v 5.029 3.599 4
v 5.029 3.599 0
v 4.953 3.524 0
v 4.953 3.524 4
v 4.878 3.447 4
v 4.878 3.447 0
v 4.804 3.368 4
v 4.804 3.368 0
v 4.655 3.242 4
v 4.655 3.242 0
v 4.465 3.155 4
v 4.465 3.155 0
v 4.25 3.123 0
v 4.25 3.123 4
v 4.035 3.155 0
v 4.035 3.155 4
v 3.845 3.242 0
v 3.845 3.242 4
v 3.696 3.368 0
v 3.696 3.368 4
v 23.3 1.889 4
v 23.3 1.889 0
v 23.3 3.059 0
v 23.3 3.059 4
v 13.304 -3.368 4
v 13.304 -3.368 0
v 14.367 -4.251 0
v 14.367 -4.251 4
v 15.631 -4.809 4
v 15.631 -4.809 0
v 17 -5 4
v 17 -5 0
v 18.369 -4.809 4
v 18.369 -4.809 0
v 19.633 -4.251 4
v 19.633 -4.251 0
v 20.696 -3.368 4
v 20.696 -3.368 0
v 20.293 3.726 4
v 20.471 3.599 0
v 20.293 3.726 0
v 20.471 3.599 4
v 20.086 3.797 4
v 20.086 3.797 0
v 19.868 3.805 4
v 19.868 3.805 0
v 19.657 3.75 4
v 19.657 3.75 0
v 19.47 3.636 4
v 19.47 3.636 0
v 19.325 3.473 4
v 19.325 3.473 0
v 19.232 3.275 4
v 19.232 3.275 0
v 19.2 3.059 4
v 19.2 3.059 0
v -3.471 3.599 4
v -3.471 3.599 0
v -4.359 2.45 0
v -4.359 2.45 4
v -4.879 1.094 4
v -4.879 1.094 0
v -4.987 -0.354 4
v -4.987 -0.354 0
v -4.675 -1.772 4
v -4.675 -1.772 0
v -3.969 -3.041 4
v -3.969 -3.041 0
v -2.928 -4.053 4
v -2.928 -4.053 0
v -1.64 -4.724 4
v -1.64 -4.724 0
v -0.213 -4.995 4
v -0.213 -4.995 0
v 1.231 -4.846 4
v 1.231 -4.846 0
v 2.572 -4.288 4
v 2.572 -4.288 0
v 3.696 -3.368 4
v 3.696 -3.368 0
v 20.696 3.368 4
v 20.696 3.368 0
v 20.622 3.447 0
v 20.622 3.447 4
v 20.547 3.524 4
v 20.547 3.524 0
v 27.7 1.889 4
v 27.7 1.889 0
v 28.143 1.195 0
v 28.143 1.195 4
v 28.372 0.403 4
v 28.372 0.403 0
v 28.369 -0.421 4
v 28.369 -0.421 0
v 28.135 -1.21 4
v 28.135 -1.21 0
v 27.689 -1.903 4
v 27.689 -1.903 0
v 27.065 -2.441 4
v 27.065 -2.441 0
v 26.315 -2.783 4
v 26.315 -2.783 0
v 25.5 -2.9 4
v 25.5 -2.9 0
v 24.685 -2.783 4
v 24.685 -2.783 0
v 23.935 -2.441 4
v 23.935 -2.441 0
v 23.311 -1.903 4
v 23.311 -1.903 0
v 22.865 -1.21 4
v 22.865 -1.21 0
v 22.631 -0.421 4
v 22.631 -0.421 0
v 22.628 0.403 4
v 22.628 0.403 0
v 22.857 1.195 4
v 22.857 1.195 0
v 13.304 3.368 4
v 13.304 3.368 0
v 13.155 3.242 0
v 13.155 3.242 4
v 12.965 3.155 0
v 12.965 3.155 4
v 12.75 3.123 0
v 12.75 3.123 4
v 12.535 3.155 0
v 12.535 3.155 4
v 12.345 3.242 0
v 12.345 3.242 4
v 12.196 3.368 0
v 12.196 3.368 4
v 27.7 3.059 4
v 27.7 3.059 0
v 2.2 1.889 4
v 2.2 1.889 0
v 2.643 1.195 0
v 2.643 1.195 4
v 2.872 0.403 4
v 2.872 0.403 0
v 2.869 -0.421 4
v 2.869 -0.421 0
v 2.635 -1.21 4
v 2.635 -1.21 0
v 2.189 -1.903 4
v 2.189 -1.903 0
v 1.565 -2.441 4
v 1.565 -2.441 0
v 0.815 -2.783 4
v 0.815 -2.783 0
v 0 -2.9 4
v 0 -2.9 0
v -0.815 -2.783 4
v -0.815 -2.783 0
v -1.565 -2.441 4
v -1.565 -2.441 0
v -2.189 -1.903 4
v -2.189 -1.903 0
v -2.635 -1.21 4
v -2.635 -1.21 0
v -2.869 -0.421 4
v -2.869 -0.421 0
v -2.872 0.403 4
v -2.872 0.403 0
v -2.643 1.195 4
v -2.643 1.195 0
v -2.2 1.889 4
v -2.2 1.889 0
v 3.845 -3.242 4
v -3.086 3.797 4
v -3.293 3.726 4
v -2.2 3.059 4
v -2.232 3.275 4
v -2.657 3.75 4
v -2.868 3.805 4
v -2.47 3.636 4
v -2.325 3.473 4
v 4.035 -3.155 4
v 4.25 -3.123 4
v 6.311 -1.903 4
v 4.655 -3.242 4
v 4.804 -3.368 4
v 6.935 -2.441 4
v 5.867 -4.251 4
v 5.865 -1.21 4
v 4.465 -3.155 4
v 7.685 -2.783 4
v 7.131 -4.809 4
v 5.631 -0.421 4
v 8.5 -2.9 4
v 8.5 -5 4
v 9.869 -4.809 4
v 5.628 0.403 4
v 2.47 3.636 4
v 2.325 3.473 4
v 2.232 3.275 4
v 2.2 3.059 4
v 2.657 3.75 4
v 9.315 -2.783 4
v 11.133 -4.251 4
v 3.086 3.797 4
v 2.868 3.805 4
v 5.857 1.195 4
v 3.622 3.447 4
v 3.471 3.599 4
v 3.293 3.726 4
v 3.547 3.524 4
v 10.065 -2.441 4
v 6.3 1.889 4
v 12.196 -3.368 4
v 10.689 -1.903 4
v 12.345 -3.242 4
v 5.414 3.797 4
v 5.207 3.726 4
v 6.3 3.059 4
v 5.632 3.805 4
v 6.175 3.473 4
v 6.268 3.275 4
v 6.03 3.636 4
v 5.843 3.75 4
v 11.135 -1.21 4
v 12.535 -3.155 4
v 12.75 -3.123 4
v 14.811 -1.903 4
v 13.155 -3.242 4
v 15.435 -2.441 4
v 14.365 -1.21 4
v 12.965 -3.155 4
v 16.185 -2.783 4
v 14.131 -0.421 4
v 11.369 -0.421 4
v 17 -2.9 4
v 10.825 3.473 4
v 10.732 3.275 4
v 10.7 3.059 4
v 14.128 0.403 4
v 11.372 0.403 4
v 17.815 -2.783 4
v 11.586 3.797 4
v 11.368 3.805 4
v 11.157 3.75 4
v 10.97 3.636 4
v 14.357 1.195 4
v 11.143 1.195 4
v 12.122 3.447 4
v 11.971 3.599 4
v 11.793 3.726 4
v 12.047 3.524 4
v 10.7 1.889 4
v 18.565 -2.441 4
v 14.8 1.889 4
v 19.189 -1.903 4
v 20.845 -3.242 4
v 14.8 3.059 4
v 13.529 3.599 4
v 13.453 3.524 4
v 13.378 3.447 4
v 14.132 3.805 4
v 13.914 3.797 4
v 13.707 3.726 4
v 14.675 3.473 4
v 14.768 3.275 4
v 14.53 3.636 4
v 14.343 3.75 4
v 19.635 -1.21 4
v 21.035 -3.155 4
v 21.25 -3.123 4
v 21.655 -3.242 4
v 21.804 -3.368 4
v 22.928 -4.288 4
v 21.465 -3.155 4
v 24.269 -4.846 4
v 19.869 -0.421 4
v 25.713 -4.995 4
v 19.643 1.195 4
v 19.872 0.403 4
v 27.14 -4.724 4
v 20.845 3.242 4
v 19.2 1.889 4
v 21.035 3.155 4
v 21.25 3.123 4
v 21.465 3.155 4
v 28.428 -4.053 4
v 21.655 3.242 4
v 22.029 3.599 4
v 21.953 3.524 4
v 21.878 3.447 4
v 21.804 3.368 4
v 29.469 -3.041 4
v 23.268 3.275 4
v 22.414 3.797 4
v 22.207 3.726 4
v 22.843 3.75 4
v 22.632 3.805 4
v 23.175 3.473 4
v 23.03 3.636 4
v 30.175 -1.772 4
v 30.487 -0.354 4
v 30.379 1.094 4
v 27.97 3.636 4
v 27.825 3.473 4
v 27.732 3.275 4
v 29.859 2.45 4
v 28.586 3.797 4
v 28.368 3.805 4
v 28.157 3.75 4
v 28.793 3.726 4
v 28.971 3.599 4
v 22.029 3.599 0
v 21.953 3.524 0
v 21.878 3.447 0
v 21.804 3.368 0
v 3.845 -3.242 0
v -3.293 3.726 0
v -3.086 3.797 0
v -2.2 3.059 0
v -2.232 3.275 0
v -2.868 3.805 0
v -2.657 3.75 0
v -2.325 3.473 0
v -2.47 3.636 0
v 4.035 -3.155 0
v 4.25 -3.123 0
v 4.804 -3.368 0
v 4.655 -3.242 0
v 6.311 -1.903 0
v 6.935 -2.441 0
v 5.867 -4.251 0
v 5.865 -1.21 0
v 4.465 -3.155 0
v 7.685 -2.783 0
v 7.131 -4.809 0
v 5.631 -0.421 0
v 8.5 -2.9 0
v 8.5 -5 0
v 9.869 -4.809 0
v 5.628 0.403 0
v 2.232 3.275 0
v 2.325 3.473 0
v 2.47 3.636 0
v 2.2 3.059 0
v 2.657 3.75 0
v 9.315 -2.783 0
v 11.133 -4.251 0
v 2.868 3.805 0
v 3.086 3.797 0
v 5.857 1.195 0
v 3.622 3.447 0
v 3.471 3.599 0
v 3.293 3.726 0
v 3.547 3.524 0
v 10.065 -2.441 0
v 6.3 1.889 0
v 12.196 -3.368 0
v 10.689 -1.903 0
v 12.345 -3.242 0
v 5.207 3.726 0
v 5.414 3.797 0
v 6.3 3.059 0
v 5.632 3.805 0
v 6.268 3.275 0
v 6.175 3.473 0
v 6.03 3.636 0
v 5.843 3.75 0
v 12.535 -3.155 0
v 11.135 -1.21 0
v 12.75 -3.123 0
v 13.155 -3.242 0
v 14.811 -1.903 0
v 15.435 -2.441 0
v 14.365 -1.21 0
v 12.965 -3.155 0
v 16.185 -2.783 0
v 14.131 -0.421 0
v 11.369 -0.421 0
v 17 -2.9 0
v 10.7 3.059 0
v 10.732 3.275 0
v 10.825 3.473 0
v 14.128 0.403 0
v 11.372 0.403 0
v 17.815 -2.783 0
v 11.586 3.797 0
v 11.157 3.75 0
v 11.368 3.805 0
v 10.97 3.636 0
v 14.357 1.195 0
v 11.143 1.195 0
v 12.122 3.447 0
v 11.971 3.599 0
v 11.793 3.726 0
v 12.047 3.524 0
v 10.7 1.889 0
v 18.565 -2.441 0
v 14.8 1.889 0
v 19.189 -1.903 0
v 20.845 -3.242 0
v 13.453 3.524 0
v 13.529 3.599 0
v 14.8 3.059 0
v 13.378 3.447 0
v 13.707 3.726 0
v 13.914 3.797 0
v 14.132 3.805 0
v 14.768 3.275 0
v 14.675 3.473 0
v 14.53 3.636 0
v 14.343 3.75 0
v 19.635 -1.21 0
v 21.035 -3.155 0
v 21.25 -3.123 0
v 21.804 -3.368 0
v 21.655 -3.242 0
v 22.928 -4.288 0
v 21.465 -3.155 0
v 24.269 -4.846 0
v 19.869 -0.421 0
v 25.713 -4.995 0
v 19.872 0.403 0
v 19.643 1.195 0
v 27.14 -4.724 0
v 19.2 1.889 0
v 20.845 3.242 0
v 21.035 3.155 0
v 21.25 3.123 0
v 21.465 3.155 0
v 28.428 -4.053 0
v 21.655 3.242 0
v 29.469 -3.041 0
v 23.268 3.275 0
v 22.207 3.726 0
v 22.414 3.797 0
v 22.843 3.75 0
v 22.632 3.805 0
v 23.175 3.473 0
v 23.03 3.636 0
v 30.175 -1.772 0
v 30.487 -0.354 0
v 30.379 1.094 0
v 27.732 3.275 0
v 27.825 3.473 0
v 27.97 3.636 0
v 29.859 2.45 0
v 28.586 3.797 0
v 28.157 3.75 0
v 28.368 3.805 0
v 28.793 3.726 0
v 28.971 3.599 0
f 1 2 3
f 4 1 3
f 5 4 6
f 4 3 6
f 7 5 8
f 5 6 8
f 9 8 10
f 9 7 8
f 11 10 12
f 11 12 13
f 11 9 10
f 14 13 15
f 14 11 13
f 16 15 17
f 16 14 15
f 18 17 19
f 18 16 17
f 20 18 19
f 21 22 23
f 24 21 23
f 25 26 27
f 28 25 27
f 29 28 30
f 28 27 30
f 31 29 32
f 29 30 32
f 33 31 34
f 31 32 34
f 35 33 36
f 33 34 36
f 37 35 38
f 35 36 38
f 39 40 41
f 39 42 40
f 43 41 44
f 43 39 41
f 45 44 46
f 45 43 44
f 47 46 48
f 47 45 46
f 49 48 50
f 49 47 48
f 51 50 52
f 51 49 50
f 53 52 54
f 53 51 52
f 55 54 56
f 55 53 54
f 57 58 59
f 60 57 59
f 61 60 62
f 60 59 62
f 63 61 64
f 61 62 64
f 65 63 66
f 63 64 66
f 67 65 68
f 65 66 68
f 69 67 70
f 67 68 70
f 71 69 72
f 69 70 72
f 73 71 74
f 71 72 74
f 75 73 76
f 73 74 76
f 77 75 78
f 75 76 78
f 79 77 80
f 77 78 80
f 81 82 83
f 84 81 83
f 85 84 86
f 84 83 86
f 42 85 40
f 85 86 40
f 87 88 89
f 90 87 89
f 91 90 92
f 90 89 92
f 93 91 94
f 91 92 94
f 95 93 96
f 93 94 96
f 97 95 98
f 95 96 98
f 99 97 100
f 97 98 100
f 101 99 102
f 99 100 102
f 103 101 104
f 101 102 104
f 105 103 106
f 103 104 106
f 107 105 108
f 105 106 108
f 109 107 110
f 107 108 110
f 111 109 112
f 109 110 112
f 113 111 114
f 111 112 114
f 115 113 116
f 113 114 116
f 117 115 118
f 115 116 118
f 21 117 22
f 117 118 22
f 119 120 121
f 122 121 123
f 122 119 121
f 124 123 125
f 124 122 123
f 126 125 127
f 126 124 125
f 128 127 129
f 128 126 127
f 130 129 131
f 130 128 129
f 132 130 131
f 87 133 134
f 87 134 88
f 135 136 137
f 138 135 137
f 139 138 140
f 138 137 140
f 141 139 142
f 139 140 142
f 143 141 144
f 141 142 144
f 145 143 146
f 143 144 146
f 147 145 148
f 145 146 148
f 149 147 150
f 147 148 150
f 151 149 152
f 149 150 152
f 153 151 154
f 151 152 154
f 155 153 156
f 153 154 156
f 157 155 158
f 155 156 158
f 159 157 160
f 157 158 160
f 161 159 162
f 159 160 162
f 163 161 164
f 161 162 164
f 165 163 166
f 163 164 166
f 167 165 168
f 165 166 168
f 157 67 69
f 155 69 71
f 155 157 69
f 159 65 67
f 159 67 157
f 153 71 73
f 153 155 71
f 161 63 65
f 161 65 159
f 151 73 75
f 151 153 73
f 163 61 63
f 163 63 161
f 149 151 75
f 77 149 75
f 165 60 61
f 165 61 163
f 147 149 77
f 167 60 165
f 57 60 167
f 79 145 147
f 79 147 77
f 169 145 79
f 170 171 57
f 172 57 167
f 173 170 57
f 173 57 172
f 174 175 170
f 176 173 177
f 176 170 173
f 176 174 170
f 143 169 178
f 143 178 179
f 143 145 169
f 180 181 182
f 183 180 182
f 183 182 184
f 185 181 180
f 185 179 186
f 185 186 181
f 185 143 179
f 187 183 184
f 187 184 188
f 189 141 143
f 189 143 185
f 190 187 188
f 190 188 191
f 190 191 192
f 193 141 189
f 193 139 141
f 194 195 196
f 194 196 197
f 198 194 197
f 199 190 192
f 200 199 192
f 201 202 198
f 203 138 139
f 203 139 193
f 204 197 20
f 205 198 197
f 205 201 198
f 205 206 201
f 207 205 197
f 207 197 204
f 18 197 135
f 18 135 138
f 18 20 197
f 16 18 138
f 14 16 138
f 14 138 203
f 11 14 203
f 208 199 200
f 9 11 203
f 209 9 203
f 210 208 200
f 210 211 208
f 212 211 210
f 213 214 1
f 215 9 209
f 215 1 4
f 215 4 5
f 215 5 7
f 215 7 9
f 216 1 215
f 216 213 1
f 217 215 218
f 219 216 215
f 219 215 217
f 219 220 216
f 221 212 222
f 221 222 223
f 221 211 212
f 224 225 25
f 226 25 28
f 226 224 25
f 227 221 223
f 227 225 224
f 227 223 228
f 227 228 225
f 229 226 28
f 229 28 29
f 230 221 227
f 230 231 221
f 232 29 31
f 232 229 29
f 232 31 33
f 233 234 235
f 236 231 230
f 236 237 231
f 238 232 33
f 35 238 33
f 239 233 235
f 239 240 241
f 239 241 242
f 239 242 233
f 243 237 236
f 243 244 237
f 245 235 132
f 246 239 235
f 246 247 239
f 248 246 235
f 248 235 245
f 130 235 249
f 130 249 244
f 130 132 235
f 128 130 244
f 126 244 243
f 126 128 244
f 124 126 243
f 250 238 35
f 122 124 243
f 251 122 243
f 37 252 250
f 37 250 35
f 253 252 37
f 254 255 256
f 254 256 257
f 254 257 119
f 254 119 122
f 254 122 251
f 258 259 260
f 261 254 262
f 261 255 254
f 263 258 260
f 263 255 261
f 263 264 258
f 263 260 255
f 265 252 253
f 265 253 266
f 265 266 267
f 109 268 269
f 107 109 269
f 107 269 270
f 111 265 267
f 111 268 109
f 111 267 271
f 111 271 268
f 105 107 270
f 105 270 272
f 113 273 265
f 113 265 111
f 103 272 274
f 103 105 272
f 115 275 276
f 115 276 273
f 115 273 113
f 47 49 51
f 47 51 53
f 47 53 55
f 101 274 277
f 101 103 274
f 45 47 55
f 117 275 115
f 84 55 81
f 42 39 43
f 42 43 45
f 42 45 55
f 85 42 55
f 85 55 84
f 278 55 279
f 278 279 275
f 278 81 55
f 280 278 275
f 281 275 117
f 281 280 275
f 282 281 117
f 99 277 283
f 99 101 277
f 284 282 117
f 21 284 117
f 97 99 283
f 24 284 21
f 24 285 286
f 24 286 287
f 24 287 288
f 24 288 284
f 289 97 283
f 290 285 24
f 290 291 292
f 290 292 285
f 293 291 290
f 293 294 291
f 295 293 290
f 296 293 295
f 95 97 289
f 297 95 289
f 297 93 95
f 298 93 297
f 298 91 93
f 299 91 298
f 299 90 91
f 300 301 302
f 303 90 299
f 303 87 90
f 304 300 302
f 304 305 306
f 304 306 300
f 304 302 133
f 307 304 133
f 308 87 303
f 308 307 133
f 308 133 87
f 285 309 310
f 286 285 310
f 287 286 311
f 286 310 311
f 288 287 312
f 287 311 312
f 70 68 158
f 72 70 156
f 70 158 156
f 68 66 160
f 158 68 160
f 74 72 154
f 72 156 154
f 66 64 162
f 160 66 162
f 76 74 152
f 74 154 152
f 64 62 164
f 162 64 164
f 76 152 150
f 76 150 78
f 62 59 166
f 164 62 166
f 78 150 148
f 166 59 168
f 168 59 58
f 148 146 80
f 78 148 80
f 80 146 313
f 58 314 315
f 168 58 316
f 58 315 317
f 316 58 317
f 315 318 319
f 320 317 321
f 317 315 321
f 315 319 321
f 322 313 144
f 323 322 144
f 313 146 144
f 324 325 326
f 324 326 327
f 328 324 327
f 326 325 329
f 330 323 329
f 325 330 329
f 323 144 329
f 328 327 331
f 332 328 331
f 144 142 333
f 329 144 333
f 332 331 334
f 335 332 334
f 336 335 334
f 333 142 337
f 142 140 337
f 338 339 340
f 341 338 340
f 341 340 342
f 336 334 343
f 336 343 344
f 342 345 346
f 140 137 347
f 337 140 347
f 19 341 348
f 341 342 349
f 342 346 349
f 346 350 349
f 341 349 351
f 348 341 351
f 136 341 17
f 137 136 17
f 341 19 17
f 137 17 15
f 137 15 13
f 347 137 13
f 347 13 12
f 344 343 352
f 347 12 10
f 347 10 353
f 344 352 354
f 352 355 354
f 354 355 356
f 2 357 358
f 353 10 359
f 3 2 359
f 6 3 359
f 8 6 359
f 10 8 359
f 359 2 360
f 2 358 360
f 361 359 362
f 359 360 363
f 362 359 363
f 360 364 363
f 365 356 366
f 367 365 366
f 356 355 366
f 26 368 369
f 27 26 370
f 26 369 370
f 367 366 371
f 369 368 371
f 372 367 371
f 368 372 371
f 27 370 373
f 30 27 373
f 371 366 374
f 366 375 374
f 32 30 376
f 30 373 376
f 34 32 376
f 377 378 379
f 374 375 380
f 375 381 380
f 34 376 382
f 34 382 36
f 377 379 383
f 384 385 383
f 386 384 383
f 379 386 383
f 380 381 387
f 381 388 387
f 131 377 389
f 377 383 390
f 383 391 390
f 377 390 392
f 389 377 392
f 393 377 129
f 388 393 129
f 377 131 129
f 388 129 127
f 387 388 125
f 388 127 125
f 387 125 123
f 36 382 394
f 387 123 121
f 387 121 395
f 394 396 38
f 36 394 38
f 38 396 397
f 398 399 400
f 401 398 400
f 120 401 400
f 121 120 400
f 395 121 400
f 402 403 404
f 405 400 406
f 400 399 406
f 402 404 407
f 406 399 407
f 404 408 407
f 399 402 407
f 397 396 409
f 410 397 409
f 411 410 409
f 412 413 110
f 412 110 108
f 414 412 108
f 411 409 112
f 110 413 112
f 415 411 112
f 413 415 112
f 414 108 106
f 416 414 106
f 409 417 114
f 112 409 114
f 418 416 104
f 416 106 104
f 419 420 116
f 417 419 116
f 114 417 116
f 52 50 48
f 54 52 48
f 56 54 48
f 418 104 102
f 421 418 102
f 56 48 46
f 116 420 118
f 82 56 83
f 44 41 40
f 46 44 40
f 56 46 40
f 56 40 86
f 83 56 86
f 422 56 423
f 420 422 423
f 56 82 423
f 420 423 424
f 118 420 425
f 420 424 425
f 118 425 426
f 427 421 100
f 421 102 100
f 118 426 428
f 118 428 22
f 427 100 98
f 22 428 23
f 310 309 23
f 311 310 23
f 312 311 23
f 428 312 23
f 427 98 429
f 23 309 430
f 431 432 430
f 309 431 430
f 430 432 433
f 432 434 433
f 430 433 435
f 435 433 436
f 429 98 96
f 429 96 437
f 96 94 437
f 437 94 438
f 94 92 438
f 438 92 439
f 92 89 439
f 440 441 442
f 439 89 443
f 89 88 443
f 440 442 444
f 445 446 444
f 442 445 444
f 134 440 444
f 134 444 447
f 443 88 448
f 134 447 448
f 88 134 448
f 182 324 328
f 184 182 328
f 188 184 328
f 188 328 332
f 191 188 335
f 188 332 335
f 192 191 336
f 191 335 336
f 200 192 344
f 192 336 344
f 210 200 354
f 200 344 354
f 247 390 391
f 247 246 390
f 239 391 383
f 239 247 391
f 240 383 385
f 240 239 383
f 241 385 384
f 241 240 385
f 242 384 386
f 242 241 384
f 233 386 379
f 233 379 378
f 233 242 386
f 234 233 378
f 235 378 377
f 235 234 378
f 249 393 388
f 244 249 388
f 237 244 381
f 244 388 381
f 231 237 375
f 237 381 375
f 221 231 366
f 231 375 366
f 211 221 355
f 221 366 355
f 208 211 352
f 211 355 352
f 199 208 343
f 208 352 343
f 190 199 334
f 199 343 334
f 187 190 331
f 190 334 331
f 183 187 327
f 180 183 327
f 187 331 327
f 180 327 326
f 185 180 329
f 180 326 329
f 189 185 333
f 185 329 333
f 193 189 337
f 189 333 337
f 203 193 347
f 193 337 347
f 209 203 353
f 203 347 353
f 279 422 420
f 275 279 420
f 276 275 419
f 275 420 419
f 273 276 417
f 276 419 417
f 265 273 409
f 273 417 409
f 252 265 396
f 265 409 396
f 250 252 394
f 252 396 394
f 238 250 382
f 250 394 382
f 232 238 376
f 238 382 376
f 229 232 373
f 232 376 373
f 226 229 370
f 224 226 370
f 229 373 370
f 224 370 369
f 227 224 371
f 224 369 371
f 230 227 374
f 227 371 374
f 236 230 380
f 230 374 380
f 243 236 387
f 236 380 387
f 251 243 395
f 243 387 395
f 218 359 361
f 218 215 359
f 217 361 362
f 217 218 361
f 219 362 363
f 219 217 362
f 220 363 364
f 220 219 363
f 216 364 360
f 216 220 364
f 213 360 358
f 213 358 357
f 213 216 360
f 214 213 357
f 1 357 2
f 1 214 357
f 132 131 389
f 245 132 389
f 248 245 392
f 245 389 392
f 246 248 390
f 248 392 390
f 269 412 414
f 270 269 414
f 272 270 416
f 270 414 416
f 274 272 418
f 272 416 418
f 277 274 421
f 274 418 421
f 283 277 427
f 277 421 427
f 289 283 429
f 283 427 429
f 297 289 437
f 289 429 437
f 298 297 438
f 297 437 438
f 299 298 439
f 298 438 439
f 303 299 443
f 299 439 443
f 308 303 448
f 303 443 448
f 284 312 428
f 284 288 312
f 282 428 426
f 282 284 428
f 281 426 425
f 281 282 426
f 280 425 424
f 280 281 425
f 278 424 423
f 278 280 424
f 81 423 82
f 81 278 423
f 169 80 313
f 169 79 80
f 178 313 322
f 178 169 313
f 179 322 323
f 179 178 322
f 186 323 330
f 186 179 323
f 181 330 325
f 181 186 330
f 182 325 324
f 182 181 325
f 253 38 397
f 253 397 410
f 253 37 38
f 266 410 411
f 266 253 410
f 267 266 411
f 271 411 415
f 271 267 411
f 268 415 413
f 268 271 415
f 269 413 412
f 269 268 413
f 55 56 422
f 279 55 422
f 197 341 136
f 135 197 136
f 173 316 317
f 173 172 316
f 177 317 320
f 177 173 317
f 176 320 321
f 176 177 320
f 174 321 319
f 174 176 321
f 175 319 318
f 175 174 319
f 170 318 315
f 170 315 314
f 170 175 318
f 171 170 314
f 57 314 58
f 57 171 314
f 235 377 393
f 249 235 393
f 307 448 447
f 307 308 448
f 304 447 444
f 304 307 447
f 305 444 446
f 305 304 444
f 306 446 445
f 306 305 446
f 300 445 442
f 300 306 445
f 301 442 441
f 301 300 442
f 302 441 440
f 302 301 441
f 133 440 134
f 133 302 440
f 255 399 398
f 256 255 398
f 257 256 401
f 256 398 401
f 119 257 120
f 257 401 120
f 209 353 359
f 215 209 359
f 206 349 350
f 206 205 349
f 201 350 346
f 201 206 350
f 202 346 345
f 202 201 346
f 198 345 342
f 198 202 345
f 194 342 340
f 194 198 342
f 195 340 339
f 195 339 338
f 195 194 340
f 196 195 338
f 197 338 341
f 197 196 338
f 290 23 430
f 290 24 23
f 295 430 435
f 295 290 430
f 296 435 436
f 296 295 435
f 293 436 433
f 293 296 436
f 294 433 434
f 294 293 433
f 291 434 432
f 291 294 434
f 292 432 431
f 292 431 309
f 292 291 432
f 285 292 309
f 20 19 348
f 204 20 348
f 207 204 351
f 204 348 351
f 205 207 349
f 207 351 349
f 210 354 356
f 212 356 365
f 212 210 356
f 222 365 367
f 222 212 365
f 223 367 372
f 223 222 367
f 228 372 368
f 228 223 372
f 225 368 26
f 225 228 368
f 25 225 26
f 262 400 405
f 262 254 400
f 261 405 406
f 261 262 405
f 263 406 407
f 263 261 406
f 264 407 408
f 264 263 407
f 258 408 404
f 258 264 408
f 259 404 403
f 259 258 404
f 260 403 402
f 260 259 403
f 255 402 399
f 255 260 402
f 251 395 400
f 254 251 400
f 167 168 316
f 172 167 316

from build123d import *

# Parameters (mm, degrees)
F1_DEPTH = 4
F2_R     = 0.75


with BuildPart() as f1:
    # F0 (on Top) → F1 (new body)
    with BuildSketch(Plane.XY):
        with BuildLine():
            ThreePointArc((2.2, 1.8894443628), (0, -2.9), (-2.2, 1.8894443628))
            Line((-2.2, 1.8894443628), (-2.2, 4.4899888641))
            ThreePointArc((-2.2, 4.4899888641), (-3.7064971339, -3.3558723153), (4.25, -2.6339134382))
            ThreePointArc((4.25, -2.6339134382), (3.5, 0), (4.25, 2.6339134382))
            ThreePointArc((4.25, 2.6339134382), (3.3558723153, 3.7064971339), (2.2, 4.4899888641))
            Line((2.2, 4.4899888641), (2.2, 1.8894443628))
        make_face()
        with BuildLine():
            ThreePointArc((4.25, 2.6339134382), (3.5, 0), (4.25, -2.6339134382))
            ThreePointArc((4.25, -2.6339134382), (5, 0), (4.25, 2.6339134382))
        make_face()
        with BuildLine():
            ThreePointArc((4.25, 2.6339134382), (5, 0), (4.25, -2.6339134382))
            ThreePointArc((4.25, -2.6339134382), (8.5, -5), (12.75, -2.6339134382))
            ThreePointArc((12.75, -2.6339134382), (12, 0), (12.75, 2.6339134382))
            ThreePointArc((12.75, 2.6339134382), (11.8558723153, 3.7064971339), (10.7, 4.4899888641))
            Line((10.7, 4.4899888641), (10.7, 1.8894443628))
            ThreePointArc((10.7, 1.8894443628), (8.5, -2.9), (6.3, 1.8894443628))
            Line((6.3, 1.8894443628), (6.3, 4.4899888641))
            ThreePointArc((6.3, 4.4899888641), (5.1441276847, 3.7064971339), (4.25, 2.6339134382))
        make_face()
        with BuildLine():
            ThreePointArc((12.75, 2.6339134382), (12, 0), (12.75, -2.6339134382))
            ThreePointArc((12.75, -2.6339134382), (13.5, 0), (12.75, 2.6339134382))
        make_face()
        with BuildLine():
            ThreePointArc((12.75, 2.6339134382), (13.5, 0), (12.75, -2.6339134382))
            ThreePointArc((12.75, -2.6339134382), (17, -5), (21.25, -2.6339134382))
            ThreePointArc((21.25, -2.6339134382), (20.5, 0), (21.25, 2.6339134382))
            ThreePointArc((21.25, 2.6339134382), (20.3558723153, 3.7064971339), (19.2, 4.4899888641))
            Line((19.2, 4.4899888641), (19.2, 1.8894443628))
            ThreePointArc((19.2, 1.8894443628), (17, -2.9), (14.8, 1.8894443628))
            Line((14.8, 1.8894443628), (14.8, 4.4899888641))
            ThreePointArc((14.8, 4.4899888641), (13.6441276847, 3.7064971339), (12.75, 2.6339134382))
        make_face()
        with BuildLine():
            ThreePointArc((21.25, 2.6339134382), (20.5, 0), (21.25, -2.6339134382))
            ThreePointArc((21.25, -2.6339134382), (22, 0), (21.25, 2.6339134382))
        make_face()
        with BuildLine():
            ThreePointArc((21.25, 2.6339134382), (22, 0), (21.25, -2.6339134382))
            ThreePointArc((21.25, -2.6339134382), (29.2064971339, -3.3558723153), (27.7, 4.4899888641))
            Line((27.7, 4.4899888641), (27.7, 1.8894443628))
            ThreePointArc((27.7, 1.8894443628), (25.5, -2.9), (23.3, 1.8894443628))
            Line((23.3, 1.8894443628), (23.3, 4.4899888641))
            ThreePointArc((23.3, 4.4899888641), (22.1441276847, 3.7064971339), (21.25, 2.6339134382))
        make_face()
    extrude(amount=F1_DEPTH)

    # F2
    f2_edges = [f1.edges().sort_by_distance(p)[0] for p in [
        (-2.2, 4.489989, 2),
        (2.2, 4.489989, 2),
        (6.3, 4.489989, 2),
        (10.7, 4.489989, 2),
        (14.8, 4.489989, 2),
        (19.2, 4.489989, 2),
        (23.3, 4.489989, 2),
        (27.7, 4.489989, 2),
        (21.25, 2.633913, 2),
        (12.75, 2.633913, 2),
        (4.25, 2.633913, 2),
        (21.25, -2.633913, 2),
        (12.75, -2.633913, 2),
        (4.25, -2.633913, 2),
    ]]
    fillet(f2_edges, radius=F2_R)


solid = f1.part
